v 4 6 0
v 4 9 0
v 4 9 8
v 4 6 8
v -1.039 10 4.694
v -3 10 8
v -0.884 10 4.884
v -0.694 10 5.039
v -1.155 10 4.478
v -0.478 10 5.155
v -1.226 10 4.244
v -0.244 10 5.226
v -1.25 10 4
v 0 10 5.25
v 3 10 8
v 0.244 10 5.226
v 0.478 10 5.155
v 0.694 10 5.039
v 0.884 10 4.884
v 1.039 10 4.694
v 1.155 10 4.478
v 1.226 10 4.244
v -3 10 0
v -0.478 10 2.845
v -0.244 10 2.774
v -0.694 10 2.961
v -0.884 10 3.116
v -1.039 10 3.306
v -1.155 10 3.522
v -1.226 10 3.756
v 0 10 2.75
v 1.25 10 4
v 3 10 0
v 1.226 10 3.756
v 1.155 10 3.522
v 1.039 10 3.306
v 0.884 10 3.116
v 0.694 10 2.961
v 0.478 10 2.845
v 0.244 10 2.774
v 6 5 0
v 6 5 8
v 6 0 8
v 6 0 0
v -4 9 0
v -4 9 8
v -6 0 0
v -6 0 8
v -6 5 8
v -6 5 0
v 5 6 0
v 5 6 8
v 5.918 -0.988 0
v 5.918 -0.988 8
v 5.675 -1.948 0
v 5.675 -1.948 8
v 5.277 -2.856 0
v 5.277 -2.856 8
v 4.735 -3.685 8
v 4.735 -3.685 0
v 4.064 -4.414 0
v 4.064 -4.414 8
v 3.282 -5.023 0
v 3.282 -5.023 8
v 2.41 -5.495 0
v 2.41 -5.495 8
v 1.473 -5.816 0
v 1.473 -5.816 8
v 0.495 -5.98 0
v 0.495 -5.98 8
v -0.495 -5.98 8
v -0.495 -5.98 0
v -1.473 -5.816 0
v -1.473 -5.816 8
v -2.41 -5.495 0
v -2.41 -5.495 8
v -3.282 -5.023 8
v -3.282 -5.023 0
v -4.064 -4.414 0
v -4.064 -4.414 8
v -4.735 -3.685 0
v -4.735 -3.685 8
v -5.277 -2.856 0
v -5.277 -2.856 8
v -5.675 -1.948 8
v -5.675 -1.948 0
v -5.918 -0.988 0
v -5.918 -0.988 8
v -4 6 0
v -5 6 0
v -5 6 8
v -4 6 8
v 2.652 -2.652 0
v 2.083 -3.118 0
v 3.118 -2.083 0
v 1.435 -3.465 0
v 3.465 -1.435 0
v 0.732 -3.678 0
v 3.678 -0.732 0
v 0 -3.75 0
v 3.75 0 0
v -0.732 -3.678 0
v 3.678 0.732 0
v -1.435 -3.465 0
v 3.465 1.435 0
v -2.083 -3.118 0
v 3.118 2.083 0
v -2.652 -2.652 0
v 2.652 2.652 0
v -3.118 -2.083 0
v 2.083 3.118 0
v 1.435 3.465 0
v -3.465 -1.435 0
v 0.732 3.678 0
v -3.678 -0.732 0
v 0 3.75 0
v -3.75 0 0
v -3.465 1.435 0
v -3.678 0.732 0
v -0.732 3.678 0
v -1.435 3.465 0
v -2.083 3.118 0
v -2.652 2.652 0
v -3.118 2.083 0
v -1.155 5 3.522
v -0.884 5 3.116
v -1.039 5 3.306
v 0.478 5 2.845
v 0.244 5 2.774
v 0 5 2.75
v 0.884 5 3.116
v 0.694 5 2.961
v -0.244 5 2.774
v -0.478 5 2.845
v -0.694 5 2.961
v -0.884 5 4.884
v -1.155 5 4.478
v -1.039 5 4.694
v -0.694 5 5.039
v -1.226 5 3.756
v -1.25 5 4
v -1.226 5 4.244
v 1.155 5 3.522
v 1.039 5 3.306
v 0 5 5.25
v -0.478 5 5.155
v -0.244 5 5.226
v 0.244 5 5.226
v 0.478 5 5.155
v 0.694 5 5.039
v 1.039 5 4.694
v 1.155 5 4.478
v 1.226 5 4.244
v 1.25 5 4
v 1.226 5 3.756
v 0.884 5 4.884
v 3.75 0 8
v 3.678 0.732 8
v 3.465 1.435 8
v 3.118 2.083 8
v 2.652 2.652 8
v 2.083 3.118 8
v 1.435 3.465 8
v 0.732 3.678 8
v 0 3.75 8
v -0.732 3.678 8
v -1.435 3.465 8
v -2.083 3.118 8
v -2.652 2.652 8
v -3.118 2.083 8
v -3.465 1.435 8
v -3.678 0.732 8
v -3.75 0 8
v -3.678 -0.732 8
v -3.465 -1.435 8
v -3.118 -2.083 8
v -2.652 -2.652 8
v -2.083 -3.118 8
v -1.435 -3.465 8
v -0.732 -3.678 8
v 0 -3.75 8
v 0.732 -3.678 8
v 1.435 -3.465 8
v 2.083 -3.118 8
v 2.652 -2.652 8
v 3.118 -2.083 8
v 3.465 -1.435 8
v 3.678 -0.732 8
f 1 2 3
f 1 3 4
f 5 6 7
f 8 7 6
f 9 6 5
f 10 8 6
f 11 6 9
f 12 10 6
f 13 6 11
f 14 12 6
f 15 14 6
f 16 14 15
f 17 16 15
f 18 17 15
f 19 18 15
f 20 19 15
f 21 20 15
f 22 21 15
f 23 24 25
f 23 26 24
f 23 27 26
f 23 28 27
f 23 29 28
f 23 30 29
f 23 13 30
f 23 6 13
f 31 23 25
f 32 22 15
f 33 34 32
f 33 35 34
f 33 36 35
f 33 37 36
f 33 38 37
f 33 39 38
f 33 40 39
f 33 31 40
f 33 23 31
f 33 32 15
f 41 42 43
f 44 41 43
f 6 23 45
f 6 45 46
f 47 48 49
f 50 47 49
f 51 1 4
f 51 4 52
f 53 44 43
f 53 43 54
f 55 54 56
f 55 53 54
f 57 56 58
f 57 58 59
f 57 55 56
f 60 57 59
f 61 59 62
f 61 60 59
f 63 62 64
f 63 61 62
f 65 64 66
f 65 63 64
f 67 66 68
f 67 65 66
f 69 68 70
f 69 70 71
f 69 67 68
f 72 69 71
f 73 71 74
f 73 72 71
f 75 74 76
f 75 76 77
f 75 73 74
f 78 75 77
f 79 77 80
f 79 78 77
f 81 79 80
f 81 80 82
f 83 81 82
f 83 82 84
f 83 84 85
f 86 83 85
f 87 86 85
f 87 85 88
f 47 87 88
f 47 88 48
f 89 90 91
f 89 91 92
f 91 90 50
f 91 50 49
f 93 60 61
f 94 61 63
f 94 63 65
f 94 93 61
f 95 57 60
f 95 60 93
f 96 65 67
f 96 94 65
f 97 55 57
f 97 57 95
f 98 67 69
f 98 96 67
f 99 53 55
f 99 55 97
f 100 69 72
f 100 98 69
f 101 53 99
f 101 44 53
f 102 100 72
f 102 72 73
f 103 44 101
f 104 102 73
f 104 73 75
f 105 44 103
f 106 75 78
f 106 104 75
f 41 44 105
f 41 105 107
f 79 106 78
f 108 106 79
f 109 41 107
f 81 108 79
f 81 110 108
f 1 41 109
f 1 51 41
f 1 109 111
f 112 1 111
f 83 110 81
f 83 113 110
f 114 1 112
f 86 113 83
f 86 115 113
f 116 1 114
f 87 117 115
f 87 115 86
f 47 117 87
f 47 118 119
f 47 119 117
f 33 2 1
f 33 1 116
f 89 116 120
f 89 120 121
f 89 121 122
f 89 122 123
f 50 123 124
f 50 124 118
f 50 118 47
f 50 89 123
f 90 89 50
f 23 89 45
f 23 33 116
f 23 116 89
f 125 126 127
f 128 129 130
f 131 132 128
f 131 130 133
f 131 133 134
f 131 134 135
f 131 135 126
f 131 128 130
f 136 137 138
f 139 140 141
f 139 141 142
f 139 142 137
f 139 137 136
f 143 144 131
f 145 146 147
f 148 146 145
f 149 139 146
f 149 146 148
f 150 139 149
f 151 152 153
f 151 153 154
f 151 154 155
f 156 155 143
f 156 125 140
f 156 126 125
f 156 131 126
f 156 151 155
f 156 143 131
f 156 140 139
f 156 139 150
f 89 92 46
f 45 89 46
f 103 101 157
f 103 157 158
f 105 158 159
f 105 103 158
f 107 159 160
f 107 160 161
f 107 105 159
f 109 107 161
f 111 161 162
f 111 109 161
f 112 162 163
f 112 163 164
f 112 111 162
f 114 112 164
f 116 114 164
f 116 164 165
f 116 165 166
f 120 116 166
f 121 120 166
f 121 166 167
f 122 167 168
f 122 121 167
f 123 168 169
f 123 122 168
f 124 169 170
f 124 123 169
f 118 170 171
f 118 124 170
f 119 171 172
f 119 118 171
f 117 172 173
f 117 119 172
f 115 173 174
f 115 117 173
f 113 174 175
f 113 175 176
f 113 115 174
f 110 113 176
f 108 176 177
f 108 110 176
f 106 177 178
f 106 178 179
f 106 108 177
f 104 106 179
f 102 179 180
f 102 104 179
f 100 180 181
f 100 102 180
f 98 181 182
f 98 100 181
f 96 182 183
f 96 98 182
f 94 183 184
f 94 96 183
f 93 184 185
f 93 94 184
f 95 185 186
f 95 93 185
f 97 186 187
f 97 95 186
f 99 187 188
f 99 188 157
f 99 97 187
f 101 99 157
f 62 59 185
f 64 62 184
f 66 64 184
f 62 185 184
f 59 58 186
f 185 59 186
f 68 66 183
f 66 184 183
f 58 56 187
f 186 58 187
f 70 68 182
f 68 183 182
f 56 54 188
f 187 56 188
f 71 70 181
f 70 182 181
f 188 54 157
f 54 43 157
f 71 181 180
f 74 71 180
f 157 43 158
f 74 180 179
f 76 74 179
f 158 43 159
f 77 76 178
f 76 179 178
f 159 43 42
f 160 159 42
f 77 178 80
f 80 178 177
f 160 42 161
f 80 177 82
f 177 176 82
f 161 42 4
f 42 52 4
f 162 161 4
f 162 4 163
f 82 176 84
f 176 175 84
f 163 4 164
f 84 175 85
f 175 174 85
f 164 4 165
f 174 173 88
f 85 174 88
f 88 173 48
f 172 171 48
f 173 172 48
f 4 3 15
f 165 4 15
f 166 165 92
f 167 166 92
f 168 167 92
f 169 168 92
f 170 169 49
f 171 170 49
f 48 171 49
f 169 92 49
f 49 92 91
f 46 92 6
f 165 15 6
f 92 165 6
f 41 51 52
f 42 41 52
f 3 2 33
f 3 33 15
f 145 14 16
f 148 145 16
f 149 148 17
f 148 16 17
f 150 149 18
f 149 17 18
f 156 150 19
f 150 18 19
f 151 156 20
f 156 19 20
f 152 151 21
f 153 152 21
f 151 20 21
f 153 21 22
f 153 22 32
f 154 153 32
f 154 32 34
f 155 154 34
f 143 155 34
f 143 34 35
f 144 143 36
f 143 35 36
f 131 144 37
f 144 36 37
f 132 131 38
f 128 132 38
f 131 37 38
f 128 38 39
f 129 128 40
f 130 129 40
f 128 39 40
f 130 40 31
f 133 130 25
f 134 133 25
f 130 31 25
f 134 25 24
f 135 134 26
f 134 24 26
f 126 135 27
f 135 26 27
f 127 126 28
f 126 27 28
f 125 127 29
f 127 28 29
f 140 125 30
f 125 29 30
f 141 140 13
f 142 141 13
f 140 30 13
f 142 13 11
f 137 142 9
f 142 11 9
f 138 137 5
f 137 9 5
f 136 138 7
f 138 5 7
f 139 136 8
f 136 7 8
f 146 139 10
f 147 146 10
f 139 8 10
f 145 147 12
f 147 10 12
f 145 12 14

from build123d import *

# Parameters (mm, degrees)
SKETCH1_R           = 3.75
BOSS_EXTRUDE2_DEPTH = 8
SKETCH11_R          = 1.25
CUT_EXTRUDE5_DEPTH  = 5
CHAMFER1_SIZE       = 1


with BuildPart() as part:
    # Sketch1 → Boss-Extrude2 (new body)
    with BuildSketch(Plane.XY):
        with BuildLine():
            Line((-6, 0), (-6, 6))
            Line((-6, 6), (-4, 6))
            Line((-4, 6), (-4, 10))
            Line((-4, 10), (4, 10))
            Line((4, 10), (4, 6))
            Line((4, 6), (6, 6))
            Line((6, 6), (6, 0))
            ThreePointArc((6, 0), (0, -6), (-6, 0))
        make_face()
        Circle(SKETCH1_R, mode=Mode.SUBTRACT)
    extrude(amount=BOSS_EXTRUDE2_DEPTH)

    # Sketch11 → Cut-Extrude5 (cut)
    with BuildSketch(Plane(origin=(0, 10, 0), x_dir=(1, 0, 0), z_dir=(0, 1, 0))):
        with Locations((0, -4)):
            Circle(SKETCH11_R)
    extrude(amount=-CUT_EXTRUDE5_DEPTH, mode=Mode.SUBTRACT)

    # Chamfer1
    chamfer1_edges = [part.edges().sort_by_distance(p)[0] for p in [
        (-6, 6, 4),
        (6, 6, 4),
        (-4, 10, 4),
        (4, 10, 4),
    ]]
    chamfer(chamfer1_edges, length=CHAMFER1_SIZE)


solid = part.part
